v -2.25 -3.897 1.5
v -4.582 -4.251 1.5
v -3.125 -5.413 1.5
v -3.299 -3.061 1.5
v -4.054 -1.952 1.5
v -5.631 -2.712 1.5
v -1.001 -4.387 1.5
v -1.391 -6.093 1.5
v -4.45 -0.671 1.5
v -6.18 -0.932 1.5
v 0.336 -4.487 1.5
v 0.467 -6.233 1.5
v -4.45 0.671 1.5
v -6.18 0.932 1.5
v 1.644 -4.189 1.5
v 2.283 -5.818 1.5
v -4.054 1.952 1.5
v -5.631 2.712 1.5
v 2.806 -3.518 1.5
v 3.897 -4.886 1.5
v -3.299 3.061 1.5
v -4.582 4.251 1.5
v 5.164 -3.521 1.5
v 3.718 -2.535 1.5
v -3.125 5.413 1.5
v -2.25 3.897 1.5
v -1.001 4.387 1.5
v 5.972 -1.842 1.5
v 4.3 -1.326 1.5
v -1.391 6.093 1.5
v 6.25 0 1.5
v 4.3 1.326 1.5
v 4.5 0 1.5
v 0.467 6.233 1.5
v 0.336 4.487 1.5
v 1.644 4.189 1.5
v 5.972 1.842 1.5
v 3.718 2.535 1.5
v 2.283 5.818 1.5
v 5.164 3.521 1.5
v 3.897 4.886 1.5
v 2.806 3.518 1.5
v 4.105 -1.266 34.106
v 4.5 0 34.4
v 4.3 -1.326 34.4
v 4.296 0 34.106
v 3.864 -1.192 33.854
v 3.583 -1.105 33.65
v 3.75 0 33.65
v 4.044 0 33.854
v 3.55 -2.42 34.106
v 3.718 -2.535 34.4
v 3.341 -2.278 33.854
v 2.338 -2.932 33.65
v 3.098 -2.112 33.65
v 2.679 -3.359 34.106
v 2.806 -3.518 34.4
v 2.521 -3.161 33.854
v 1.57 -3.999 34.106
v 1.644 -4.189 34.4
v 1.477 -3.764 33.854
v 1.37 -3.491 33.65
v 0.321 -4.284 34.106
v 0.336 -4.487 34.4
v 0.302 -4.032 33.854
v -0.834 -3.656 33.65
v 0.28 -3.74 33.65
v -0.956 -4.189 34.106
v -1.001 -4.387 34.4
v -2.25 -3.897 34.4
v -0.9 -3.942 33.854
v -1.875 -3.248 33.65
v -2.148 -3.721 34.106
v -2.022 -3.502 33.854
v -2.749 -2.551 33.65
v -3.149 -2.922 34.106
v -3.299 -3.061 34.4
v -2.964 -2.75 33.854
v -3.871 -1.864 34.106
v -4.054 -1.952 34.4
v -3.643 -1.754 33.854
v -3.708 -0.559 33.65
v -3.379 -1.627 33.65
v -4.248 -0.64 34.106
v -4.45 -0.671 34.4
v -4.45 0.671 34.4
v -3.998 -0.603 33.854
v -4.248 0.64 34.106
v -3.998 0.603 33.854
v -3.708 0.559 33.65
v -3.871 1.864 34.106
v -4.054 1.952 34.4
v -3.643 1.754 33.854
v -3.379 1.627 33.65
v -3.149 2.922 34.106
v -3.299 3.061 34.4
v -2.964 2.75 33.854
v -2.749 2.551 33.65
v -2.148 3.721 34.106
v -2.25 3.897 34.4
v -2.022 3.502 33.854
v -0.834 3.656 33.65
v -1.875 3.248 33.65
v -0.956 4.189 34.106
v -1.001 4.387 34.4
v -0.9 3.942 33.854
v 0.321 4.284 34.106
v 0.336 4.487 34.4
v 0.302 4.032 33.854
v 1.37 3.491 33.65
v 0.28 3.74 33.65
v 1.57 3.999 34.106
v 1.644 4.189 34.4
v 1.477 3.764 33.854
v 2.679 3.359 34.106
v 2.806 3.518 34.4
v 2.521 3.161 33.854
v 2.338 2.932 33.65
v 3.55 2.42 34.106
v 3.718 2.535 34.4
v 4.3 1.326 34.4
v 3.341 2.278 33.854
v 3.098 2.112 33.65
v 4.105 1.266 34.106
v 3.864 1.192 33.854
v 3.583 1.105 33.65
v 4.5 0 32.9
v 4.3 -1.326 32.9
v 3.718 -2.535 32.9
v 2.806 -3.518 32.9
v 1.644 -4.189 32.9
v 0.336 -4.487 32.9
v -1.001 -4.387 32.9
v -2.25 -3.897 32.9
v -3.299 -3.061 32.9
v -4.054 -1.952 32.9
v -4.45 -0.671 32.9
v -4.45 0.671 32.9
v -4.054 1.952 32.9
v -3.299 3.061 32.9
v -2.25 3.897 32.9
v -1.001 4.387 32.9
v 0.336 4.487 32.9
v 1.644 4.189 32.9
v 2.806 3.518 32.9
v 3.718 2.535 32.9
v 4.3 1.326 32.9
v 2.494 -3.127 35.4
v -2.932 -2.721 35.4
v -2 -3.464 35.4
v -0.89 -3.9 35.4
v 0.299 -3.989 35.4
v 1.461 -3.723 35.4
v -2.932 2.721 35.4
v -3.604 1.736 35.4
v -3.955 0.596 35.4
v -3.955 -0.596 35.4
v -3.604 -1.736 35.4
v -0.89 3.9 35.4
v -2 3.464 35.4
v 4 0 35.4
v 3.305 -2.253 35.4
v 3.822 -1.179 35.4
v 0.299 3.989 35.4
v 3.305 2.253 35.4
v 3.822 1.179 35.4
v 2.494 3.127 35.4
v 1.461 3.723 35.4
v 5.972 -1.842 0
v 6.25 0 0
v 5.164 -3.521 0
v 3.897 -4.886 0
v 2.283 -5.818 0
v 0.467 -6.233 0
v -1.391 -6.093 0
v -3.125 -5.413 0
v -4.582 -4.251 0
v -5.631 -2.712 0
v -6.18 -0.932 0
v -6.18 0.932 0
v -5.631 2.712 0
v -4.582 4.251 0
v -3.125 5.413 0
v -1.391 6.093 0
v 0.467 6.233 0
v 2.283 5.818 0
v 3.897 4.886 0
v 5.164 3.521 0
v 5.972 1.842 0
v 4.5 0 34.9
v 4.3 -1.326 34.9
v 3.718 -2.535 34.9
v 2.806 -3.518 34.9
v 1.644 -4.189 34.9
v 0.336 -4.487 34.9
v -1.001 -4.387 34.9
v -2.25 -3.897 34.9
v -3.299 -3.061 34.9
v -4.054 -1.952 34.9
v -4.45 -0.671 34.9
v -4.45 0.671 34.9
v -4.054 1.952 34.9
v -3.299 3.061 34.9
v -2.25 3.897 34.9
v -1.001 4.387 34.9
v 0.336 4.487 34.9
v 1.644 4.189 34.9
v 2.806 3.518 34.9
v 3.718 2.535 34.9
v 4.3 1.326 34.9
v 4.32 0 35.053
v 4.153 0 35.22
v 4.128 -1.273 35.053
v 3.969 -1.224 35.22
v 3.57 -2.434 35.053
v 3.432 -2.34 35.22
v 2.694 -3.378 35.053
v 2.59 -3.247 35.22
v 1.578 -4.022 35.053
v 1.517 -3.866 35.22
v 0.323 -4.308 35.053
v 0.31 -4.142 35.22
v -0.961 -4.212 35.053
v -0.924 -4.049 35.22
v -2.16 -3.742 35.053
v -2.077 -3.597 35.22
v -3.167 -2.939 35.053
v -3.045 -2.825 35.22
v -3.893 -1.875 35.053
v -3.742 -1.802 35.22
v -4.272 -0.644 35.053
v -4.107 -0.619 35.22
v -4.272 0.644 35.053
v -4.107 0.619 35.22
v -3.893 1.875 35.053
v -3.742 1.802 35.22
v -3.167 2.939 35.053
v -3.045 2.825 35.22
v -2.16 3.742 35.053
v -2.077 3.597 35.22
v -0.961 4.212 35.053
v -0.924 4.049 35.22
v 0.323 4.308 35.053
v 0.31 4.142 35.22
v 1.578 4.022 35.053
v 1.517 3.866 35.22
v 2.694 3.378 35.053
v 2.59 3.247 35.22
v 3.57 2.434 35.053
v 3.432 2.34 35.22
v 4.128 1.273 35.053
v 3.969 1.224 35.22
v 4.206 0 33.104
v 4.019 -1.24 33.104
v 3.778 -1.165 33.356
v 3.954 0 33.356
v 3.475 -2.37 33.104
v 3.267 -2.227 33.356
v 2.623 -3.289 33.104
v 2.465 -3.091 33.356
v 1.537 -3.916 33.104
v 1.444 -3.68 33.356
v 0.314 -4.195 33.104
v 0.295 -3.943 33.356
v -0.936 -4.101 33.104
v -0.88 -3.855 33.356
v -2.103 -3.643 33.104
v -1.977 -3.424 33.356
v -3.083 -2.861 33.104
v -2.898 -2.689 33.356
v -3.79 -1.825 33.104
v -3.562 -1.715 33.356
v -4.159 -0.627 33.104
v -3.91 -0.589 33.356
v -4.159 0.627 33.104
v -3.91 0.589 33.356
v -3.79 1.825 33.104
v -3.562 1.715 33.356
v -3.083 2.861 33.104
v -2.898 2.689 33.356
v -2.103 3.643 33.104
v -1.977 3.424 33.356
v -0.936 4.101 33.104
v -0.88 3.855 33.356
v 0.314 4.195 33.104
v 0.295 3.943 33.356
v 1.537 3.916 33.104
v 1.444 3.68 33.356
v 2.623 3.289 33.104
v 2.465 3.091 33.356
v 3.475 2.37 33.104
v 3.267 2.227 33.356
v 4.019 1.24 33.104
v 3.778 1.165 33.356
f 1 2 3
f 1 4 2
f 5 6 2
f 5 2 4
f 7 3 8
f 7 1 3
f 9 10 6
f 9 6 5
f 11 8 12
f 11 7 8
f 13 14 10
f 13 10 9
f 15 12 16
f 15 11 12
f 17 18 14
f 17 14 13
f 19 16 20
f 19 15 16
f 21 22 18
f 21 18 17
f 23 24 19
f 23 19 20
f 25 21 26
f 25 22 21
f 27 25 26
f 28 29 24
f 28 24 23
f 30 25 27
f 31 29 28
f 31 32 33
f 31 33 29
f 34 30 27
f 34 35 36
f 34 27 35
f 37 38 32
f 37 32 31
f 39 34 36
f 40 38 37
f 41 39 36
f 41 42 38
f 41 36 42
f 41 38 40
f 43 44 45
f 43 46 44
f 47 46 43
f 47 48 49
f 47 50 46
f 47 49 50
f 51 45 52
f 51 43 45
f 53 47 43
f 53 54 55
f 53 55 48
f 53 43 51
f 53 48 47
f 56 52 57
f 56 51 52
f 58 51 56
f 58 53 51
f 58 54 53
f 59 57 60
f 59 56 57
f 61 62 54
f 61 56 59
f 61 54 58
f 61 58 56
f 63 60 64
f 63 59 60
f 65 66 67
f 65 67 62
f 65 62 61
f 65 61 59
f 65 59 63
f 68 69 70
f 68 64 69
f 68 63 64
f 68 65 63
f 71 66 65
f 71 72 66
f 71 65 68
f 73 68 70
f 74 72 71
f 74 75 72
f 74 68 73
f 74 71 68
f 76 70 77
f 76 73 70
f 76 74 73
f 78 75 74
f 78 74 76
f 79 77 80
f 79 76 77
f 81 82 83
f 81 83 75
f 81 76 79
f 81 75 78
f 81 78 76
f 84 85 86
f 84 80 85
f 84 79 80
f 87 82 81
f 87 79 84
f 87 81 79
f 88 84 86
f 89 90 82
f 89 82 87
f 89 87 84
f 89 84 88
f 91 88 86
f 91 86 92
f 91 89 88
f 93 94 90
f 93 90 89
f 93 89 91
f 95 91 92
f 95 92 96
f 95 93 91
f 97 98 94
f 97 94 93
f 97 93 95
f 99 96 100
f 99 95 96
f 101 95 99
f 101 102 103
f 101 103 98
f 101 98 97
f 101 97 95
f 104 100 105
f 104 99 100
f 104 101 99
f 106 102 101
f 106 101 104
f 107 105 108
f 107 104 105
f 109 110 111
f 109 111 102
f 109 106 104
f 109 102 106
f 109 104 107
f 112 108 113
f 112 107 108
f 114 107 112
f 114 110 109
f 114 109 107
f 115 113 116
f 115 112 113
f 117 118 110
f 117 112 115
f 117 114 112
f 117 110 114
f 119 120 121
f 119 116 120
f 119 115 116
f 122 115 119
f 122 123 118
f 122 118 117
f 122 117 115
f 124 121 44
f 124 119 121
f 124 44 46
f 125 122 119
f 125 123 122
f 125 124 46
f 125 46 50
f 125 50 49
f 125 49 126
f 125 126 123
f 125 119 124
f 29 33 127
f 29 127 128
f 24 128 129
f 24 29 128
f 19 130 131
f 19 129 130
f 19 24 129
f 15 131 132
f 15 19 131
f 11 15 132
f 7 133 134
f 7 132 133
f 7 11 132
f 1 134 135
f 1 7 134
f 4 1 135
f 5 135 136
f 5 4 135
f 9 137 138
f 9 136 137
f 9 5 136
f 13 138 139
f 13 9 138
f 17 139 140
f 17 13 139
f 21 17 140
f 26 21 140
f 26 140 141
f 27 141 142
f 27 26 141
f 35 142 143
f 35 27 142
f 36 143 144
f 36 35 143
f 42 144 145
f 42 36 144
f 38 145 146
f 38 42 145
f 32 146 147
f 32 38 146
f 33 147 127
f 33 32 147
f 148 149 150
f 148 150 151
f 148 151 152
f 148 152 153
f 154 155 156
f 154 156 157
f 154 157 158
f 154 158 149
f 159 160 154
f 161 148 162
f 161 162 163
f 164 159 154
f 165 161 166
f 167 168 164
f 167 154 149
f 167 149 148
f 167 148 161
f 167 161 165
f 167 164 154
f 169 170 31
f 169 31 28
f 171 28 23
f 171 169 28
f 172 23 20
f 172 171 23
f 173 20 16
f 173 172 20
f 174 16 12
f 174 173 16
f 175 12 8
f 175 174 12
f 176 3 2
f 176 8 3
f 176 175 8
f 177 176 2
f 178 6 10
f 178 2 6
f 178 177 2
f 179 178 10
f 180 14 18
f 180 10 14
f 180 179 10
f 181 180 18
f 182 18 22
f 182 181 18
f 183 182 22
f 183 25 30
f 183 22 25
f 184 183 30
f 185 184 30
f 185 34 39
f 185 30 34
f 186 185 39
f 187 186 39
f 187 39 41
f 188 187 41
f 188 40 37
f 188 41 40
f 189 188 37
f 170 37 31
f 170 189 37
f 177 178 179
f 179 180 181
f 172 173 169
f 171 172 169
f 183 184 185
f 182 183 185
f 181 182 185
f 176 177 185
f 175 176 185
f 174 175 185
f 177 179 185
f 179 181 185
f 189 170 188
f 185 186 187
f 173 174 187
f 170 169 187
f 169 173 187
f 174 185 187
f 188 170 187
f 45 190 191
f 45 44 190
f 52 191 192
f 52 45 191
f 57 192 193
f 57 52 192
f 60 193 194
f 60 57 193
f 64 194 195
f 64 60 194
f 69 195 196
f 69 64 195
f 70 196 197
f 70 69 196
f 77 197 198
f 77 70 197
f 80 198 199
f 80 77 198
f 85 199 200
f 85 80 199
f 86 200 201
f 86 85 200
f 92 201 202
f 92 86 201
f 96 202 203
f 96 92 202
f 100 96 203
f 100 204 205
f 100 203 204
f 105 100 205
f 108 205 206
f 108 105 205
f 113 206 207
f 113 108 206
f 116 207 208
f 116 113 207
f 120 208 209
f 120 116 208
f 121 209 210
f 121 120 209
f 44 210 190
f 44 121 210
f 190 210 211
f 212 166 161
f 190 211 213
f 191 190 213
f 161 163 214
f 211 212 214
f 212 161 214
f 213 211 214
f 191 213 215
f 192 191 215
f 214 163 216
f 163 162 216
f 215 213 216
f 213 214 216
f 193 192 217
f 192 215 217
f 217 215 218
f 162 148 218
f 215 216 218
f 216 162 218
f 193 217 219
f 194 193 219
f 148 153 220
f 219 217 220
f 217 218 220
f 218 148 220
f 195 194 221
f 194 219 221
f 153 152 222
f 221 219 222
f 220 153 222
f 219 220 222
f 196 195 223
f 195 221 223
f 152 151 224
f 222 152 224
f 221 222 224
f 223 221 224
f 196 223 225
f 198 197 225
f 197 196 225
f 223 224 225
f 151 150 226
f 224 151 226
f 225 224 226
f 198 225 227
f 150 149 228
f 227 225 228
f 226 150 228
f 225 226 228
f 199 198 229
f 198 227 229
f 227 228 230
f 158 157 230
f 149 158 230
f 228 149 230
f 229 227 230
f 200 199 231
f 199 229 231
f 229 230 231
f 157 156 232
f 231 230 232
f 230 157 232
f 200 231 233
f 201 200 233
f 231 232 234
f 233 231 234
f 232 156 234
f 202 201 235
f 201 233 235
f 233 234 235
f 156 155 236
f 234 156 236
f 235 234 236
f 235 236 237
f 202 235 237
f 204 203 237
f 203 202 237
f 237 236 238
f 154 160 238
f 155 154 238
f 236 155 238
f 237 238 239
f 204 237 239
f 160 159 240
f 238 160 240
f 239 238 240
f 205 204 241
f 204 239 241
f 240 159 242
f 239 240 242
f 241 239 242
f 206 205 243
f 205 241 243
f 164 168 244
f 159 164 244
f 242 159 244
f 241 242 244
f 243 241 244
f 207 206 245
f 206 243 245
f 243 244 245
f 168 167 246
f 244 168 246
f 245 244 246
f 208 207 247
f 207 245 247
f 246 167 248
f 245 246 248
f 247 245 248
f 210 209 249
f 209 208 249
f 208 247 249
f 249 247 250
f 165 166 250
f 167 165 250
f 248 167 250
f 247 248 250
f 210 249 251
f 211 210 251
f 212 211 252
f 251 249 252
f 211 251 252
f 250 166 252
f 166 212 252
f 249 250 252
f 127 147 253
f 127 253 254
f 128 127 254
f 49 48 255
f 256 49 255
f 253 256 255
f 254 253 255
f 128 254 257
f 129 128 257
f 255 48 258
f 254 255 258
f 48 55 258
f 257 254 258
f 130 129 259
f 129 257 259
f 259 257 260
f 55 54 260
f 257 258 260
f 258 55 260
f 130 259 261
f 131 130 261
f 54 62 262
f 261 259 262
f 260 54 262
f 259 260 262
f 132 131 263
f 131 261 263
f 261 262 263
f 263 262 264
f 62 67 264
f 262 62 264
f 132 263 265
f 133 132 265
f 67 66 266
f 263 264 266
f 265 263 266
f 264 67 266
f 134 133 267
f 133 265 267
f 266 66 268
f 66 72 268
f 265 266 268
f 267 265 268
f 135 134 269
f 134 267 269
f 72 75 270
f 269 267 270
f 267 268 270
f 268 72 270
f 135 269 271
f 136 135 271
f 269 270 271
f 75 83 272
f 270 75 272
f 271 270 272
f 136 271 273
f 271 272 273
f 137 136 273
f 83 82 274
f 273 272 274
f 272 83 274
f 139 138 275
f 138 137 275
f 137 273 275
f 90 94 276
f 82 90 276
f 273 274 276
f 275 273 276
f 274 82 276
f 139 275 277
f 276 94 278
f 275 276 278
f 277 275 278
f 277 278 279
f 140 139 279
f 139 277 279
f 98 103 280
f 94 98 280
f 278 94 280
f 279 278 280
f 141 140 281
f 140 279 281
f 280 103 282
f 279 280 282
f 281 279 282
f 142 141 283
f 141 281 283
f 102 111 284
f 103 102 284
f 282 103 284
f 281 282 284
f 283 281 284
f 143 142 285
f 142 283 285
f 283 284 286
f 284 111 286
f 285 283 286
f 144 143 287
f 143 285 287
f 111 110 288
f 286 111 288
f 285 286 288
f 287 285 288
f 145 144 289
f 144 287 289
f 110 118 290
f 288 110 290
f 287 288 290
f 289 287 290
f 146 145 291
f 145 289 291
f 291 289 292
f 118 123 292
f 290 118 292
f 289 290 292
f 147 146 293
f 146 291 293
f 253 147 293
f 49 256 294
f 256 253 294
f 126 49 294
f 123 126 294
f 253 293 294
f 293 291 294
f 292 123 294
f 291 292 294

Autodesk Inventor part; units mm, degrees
ref_plane "YZ Plane" through (0, 0, 0) normal (1, 0, 0) x (0, 1, 0)
ref_plane "XZ Plane" through (0, 0, 0) normal (0, 1, 0) x (-1, 0, 0)
ref_plane "XY Plane" through (0, 0, 0) normal (0, 0, 1) x (1, 0, 0)
sketch "Sketch1" plane through (0, 0, 0) normal (0, 0, 1) x (1, 0, 0)
  circle A0 centre (0, 0) radius 6.25
  dimension "d0" = 12.5
extrude "Extrusion1" add sketch "Sketch1" along normal blind 1.5
sketch "Sketch2" plane through (0, 0, 1.5) normal (0, 0, 1) x (1, 0, 0)
  circle A0 centre (0, 0) radius 6.25 projected
  circle A1 centre (0, 0) radius 4.5
  dimension "d3" = 9
extrude "Extrusion2" add sketch "Sketch2" along normal blind 31.4 contours A1
sketch "Sketch3" plane through (0, 0, 32.9) normal (0, 0, 1) x (1, 0, 0)
  circle A0 centre (0, 0) radius 4.5 projected
  circle A1 centre (0, 0) radius 3.75
  dimension "d6" = 7.5
extrude "Extrusion3" add sketch "Sketch3" along normal blind 0.75 contours A1
fillet "Fillet1" radius 2 1 edges at (-3.75, 0, 32.9)
sketch "Sketch4" plane through (0, 0, 33.65) normal (0, 0, 1) x (1, 0, 0)
  circle A0 centre (0, 0) radius 4.5
  dimension "d10" = 9
extrude "Extrusion4" add sketch "Sketch4" along normal blind 0.75
fillet "Fillet2" radius 2 1 edges at (-4.5, 0, 33.65)
sketch "Sketch5" plane through (0, 0, 34.4) normal (0, 0, 1) x (1, 0, 0)
  circle A0 centre (0, 0) radius 4.5
  dimension "d14" = 9
extrude "Extrusion5" add sketch "Sketch5" along normal blind 0.5
sketch "Sketch6" plane through (0, 0, 34.9) normal (0, 0, 1) x (1, 0, 0)
  circle A0 centre (0, 0) radius 4
  dimension "d17" = 8
extrude "Extrusion6" add sketch "Sketch6" along normal blind 0.5
fillet "Fillet3" radius 3 1 edges at (-4, 0, 34.9)
properties part number "Long Pin_3DPrint"
